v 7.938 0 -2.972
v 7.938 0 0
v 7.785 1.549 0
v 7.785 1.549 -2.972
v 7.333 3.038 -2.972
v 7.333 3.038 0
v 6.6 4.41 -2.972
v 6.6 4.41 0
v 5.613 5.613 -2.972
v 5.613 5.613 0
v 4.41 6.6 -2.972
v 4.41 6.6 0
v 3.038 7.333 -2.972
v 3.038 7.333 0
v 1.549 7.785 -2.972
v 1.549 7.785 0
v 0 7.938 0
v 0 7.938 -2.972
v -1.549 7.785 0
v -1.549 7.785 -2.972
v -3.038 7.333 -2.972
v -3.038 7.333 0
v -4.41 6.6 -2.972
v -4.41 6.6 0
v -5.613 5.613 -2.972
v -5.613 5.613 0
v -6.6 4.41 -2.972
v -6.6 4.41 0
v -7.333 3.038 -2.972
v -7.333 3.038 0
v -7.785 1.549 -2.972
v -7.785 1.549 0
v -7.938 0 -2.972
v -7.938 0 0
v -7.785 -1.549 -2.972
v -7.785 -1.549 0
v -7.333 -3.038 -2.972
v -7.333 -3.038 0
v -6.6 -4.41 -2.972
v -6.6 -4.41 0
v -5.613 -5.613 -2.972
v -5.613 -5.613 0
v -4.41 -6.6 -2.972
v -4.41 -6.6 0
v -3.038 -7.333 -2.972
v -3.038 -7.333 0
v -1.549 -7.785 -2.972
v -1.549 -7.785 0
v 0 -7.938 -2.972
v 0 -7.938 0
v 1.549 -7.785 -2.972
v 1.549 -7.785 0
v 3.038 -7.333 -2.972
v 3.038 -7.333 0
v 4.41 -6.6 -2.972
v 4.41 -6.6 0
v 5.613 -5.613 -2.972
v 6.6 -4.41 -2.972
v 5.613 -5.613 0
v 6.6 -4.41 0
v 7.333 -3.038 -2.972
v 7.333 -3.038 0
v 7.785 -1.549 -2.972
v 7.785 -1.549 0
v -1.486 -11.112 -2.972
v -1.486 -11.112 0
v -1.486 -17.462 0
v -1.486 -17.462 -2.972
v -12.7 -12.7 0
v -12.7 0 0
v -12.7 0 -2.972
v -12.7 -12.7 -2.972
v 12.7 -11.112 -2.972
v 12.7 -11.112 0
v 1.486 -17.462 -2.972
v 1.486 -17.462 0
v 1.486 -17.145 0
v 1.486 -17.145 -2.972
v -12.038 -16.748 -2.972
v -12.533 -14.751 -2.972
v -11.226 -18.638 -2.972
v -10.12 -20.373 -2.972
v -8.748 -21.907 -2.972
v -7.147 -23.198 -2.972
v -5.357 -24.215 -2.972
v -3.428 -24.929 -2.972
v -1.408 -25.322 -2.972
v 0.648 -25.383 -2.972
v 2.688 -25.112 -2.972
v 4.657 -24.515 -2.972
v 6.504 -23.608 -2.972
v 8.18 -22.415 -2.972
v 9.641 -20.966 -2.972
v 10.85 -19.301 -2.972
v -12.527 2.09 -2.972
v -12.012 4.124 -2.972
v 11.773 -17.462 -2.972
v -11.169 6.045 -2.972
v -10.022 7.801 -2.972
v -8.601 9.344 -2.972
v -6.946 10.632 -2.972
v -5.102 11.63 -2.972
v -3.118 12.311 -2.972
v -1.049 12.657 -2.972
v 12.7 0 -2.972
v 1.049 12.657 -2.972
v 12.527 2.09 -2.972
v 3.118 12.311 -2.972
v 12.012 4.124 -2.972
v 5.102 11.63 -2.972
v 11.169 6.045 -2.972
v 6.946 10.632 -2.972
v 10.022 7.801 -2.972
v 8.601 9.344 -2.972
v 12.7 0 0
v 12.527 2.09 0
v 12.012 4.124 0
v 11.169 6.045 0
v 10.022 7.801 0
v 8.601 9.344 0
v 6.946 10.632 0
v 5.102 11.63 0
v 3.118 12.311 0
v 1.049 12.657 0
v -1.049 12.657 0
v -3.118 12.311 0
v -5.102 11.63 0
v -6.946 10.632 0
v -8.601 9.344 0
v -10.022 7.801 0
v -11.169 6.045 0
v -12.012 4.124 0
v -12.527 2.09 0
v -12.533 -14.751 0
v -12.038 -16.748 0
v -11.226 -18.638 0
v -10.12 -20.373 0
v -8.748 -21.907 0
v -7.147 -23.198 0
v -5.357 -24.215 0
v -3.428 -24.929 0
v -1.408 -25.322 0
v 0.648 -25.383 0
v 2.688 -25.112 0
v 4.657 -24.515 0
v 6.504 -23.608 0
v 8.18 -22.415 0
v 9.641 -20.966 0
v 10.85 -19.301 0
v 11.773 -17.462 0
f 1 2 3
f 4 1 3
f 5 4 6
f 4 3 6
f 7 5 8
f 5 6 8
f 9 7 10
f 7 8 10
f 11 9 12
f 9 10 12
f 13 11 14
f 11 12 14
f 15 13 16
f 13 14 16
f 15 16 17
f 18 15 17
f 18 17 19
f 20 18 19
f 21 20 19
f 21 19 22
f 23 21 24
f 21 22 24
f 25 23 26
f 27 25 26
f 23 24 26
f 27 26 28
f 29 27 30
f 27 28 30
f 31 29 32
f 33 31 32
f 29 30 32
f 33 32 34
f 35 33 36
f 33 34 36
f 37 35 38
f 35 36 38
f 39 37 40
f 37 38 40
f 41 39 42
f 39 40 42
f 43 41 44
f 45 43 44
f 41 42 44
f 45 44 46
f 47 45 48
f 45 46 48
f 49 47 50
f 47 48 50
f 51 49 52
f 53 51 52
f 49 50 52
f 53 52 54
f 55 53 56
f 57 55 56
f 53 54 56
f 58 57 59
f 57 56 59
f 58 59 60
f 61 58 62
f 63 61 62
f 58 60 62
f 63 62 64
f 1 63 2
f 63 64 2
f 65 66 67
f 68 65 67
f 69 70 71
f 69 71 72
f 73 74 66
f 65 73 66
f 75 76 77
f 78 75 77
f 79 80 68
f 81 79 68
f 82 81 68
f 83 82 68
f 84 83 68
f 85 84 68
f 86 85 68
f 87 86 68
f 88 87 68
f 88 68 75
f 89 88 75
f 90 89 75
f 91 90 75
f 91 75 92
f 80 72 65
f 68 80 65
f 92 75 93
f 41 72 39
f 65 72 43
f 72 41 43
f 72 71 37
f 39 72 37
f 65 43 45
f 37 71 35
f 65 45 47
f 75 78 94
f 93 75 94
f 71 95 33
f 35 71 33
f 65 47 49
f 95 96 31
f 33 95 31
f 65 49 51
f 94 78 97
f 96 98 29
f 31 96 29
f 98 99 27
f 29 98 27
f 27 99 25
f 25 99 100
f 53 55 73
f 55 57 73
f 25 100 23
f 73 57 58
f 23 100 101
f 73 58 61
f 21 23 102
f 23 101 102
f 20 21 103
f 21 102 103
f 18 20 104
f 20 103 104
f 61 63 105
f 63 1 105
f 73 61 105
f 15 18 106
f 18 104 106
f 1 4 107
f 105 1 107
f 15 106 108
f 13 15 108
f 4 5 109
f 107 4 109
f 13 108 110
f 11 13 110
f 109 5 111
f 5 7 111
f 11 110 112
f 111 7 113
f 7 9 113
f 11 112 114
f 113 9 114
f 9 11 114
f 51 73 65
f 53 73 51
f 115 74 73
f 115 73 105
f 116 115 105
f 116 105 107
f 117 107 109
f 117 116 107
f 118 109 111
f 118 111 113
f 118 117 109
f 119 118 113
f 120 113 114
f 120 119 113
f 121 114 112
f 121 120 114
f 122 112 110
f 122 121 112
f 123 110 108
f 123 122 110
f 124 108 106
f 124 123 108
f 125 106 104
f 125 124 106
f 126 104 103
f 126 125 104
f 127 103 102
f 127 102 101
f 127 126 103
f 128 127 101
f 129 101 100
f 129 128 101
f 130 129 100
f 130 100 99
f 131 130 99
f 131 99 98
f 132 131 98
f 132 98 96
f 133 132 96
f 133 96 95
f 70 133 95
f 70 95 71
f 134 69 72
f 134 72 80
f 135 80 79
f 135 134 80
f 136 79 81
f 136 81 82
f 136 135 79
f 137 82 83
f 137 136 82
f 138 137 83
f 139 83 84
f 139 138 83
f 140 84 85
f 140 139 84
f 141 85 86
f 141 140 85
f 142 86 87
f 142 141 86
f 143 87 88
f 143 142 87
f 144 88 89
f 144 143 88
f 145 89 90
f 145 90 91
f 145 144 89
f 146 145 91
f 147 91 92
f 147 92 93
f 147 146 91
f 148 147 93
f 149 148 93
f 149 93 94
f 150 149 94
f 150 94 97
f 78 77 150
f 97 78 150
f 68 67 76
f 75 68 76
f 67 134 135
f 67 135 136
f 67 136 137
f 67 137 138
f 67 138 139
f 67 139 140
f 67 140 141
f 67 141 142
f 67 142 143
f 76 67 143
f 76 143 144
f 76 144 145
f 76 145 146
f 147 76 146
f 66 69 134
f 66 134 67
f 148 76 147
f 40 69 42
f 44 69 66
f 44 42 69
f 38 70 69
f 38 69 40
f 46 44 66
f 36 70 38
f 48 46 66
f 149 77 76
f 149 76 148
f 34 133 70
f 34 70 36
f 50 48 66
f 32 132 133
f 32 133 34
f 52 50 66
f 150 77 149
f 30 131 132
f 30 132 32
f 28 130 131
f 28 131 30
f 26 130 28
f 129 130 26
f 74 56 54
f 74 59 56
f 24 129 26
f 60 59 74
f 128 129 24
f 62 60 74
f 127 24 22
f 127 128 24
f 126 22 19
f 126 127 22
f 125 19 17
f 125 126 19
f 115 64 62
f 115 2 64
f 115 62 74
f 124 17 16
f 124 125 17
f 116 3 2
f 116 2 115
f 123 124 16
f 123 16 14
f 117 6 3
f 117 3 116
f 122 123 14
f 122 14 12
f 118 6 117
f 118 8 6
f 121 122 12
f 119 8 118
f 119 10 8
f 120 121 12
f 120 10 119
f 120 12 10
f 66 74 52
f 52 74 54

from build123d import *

# Parameters (mm, degrees)
F0_R     = 7.9375
F1_DEPTH = 2.9718
F3_DEPTH = 2.9718


# Not quite as in the source:
# - a feature names something its author has since deleted; it is built from what else it names


with BuildPart() as f1:
    # F0 (on Top) → F1 (new body)
    with BuildSketch(Plane.XY):
        with BuildLine():
            ThreePointArc((-12.7, 0), (0, -12.7), (12.7, 0))
            ThreePointArc((12.7, 0), (0, 12.7), (-12.7, 0))
        make_face()
        Circle(F0_R, mode=Mode.SUBTRACT)
        with BuildLine():
            Line((12.7, -12.7), (12.7, 0))
            ThreePointArc((12.7, 0), (0, -12.7), (-12.7, 0))
            Line((-12.7, 0), (-12.7, -12.7))
            ThreePointArc((-12.7, -12.7), (0, -25.4), (12.7, -12.7))
        make_face()
    extrude(amount=-F1_DEPTH)

    # F2 (on face) → F3 (cut, through all)
    with BuildSketch(Plane.XY):
        with BuildLine():
            Line((12.7, -11.1125), (-1.4859, -11.1125))
            Line((-1.4859, -11.1125), (-1.4859, -17.4625))
            Line((-1.4859, -17.4625), (1.4859, -17.4625))
            Line((1.4859, -17.4625), (1.4859, -17.145))
            Line((1.4859, -17.145), (11.7732150983, -17.4625))
            ThreePointArc((11.7732150983, -17.4625), (12.4661508042, -15.1259192332), (12.7, -12.7))
            Line((12.7, -12.7), (12.7, -11.1125))
        make_face()
    extrude(amount=-F3_DEPTH, mode=Mode.SUBTRACT)


solid = f1.part
